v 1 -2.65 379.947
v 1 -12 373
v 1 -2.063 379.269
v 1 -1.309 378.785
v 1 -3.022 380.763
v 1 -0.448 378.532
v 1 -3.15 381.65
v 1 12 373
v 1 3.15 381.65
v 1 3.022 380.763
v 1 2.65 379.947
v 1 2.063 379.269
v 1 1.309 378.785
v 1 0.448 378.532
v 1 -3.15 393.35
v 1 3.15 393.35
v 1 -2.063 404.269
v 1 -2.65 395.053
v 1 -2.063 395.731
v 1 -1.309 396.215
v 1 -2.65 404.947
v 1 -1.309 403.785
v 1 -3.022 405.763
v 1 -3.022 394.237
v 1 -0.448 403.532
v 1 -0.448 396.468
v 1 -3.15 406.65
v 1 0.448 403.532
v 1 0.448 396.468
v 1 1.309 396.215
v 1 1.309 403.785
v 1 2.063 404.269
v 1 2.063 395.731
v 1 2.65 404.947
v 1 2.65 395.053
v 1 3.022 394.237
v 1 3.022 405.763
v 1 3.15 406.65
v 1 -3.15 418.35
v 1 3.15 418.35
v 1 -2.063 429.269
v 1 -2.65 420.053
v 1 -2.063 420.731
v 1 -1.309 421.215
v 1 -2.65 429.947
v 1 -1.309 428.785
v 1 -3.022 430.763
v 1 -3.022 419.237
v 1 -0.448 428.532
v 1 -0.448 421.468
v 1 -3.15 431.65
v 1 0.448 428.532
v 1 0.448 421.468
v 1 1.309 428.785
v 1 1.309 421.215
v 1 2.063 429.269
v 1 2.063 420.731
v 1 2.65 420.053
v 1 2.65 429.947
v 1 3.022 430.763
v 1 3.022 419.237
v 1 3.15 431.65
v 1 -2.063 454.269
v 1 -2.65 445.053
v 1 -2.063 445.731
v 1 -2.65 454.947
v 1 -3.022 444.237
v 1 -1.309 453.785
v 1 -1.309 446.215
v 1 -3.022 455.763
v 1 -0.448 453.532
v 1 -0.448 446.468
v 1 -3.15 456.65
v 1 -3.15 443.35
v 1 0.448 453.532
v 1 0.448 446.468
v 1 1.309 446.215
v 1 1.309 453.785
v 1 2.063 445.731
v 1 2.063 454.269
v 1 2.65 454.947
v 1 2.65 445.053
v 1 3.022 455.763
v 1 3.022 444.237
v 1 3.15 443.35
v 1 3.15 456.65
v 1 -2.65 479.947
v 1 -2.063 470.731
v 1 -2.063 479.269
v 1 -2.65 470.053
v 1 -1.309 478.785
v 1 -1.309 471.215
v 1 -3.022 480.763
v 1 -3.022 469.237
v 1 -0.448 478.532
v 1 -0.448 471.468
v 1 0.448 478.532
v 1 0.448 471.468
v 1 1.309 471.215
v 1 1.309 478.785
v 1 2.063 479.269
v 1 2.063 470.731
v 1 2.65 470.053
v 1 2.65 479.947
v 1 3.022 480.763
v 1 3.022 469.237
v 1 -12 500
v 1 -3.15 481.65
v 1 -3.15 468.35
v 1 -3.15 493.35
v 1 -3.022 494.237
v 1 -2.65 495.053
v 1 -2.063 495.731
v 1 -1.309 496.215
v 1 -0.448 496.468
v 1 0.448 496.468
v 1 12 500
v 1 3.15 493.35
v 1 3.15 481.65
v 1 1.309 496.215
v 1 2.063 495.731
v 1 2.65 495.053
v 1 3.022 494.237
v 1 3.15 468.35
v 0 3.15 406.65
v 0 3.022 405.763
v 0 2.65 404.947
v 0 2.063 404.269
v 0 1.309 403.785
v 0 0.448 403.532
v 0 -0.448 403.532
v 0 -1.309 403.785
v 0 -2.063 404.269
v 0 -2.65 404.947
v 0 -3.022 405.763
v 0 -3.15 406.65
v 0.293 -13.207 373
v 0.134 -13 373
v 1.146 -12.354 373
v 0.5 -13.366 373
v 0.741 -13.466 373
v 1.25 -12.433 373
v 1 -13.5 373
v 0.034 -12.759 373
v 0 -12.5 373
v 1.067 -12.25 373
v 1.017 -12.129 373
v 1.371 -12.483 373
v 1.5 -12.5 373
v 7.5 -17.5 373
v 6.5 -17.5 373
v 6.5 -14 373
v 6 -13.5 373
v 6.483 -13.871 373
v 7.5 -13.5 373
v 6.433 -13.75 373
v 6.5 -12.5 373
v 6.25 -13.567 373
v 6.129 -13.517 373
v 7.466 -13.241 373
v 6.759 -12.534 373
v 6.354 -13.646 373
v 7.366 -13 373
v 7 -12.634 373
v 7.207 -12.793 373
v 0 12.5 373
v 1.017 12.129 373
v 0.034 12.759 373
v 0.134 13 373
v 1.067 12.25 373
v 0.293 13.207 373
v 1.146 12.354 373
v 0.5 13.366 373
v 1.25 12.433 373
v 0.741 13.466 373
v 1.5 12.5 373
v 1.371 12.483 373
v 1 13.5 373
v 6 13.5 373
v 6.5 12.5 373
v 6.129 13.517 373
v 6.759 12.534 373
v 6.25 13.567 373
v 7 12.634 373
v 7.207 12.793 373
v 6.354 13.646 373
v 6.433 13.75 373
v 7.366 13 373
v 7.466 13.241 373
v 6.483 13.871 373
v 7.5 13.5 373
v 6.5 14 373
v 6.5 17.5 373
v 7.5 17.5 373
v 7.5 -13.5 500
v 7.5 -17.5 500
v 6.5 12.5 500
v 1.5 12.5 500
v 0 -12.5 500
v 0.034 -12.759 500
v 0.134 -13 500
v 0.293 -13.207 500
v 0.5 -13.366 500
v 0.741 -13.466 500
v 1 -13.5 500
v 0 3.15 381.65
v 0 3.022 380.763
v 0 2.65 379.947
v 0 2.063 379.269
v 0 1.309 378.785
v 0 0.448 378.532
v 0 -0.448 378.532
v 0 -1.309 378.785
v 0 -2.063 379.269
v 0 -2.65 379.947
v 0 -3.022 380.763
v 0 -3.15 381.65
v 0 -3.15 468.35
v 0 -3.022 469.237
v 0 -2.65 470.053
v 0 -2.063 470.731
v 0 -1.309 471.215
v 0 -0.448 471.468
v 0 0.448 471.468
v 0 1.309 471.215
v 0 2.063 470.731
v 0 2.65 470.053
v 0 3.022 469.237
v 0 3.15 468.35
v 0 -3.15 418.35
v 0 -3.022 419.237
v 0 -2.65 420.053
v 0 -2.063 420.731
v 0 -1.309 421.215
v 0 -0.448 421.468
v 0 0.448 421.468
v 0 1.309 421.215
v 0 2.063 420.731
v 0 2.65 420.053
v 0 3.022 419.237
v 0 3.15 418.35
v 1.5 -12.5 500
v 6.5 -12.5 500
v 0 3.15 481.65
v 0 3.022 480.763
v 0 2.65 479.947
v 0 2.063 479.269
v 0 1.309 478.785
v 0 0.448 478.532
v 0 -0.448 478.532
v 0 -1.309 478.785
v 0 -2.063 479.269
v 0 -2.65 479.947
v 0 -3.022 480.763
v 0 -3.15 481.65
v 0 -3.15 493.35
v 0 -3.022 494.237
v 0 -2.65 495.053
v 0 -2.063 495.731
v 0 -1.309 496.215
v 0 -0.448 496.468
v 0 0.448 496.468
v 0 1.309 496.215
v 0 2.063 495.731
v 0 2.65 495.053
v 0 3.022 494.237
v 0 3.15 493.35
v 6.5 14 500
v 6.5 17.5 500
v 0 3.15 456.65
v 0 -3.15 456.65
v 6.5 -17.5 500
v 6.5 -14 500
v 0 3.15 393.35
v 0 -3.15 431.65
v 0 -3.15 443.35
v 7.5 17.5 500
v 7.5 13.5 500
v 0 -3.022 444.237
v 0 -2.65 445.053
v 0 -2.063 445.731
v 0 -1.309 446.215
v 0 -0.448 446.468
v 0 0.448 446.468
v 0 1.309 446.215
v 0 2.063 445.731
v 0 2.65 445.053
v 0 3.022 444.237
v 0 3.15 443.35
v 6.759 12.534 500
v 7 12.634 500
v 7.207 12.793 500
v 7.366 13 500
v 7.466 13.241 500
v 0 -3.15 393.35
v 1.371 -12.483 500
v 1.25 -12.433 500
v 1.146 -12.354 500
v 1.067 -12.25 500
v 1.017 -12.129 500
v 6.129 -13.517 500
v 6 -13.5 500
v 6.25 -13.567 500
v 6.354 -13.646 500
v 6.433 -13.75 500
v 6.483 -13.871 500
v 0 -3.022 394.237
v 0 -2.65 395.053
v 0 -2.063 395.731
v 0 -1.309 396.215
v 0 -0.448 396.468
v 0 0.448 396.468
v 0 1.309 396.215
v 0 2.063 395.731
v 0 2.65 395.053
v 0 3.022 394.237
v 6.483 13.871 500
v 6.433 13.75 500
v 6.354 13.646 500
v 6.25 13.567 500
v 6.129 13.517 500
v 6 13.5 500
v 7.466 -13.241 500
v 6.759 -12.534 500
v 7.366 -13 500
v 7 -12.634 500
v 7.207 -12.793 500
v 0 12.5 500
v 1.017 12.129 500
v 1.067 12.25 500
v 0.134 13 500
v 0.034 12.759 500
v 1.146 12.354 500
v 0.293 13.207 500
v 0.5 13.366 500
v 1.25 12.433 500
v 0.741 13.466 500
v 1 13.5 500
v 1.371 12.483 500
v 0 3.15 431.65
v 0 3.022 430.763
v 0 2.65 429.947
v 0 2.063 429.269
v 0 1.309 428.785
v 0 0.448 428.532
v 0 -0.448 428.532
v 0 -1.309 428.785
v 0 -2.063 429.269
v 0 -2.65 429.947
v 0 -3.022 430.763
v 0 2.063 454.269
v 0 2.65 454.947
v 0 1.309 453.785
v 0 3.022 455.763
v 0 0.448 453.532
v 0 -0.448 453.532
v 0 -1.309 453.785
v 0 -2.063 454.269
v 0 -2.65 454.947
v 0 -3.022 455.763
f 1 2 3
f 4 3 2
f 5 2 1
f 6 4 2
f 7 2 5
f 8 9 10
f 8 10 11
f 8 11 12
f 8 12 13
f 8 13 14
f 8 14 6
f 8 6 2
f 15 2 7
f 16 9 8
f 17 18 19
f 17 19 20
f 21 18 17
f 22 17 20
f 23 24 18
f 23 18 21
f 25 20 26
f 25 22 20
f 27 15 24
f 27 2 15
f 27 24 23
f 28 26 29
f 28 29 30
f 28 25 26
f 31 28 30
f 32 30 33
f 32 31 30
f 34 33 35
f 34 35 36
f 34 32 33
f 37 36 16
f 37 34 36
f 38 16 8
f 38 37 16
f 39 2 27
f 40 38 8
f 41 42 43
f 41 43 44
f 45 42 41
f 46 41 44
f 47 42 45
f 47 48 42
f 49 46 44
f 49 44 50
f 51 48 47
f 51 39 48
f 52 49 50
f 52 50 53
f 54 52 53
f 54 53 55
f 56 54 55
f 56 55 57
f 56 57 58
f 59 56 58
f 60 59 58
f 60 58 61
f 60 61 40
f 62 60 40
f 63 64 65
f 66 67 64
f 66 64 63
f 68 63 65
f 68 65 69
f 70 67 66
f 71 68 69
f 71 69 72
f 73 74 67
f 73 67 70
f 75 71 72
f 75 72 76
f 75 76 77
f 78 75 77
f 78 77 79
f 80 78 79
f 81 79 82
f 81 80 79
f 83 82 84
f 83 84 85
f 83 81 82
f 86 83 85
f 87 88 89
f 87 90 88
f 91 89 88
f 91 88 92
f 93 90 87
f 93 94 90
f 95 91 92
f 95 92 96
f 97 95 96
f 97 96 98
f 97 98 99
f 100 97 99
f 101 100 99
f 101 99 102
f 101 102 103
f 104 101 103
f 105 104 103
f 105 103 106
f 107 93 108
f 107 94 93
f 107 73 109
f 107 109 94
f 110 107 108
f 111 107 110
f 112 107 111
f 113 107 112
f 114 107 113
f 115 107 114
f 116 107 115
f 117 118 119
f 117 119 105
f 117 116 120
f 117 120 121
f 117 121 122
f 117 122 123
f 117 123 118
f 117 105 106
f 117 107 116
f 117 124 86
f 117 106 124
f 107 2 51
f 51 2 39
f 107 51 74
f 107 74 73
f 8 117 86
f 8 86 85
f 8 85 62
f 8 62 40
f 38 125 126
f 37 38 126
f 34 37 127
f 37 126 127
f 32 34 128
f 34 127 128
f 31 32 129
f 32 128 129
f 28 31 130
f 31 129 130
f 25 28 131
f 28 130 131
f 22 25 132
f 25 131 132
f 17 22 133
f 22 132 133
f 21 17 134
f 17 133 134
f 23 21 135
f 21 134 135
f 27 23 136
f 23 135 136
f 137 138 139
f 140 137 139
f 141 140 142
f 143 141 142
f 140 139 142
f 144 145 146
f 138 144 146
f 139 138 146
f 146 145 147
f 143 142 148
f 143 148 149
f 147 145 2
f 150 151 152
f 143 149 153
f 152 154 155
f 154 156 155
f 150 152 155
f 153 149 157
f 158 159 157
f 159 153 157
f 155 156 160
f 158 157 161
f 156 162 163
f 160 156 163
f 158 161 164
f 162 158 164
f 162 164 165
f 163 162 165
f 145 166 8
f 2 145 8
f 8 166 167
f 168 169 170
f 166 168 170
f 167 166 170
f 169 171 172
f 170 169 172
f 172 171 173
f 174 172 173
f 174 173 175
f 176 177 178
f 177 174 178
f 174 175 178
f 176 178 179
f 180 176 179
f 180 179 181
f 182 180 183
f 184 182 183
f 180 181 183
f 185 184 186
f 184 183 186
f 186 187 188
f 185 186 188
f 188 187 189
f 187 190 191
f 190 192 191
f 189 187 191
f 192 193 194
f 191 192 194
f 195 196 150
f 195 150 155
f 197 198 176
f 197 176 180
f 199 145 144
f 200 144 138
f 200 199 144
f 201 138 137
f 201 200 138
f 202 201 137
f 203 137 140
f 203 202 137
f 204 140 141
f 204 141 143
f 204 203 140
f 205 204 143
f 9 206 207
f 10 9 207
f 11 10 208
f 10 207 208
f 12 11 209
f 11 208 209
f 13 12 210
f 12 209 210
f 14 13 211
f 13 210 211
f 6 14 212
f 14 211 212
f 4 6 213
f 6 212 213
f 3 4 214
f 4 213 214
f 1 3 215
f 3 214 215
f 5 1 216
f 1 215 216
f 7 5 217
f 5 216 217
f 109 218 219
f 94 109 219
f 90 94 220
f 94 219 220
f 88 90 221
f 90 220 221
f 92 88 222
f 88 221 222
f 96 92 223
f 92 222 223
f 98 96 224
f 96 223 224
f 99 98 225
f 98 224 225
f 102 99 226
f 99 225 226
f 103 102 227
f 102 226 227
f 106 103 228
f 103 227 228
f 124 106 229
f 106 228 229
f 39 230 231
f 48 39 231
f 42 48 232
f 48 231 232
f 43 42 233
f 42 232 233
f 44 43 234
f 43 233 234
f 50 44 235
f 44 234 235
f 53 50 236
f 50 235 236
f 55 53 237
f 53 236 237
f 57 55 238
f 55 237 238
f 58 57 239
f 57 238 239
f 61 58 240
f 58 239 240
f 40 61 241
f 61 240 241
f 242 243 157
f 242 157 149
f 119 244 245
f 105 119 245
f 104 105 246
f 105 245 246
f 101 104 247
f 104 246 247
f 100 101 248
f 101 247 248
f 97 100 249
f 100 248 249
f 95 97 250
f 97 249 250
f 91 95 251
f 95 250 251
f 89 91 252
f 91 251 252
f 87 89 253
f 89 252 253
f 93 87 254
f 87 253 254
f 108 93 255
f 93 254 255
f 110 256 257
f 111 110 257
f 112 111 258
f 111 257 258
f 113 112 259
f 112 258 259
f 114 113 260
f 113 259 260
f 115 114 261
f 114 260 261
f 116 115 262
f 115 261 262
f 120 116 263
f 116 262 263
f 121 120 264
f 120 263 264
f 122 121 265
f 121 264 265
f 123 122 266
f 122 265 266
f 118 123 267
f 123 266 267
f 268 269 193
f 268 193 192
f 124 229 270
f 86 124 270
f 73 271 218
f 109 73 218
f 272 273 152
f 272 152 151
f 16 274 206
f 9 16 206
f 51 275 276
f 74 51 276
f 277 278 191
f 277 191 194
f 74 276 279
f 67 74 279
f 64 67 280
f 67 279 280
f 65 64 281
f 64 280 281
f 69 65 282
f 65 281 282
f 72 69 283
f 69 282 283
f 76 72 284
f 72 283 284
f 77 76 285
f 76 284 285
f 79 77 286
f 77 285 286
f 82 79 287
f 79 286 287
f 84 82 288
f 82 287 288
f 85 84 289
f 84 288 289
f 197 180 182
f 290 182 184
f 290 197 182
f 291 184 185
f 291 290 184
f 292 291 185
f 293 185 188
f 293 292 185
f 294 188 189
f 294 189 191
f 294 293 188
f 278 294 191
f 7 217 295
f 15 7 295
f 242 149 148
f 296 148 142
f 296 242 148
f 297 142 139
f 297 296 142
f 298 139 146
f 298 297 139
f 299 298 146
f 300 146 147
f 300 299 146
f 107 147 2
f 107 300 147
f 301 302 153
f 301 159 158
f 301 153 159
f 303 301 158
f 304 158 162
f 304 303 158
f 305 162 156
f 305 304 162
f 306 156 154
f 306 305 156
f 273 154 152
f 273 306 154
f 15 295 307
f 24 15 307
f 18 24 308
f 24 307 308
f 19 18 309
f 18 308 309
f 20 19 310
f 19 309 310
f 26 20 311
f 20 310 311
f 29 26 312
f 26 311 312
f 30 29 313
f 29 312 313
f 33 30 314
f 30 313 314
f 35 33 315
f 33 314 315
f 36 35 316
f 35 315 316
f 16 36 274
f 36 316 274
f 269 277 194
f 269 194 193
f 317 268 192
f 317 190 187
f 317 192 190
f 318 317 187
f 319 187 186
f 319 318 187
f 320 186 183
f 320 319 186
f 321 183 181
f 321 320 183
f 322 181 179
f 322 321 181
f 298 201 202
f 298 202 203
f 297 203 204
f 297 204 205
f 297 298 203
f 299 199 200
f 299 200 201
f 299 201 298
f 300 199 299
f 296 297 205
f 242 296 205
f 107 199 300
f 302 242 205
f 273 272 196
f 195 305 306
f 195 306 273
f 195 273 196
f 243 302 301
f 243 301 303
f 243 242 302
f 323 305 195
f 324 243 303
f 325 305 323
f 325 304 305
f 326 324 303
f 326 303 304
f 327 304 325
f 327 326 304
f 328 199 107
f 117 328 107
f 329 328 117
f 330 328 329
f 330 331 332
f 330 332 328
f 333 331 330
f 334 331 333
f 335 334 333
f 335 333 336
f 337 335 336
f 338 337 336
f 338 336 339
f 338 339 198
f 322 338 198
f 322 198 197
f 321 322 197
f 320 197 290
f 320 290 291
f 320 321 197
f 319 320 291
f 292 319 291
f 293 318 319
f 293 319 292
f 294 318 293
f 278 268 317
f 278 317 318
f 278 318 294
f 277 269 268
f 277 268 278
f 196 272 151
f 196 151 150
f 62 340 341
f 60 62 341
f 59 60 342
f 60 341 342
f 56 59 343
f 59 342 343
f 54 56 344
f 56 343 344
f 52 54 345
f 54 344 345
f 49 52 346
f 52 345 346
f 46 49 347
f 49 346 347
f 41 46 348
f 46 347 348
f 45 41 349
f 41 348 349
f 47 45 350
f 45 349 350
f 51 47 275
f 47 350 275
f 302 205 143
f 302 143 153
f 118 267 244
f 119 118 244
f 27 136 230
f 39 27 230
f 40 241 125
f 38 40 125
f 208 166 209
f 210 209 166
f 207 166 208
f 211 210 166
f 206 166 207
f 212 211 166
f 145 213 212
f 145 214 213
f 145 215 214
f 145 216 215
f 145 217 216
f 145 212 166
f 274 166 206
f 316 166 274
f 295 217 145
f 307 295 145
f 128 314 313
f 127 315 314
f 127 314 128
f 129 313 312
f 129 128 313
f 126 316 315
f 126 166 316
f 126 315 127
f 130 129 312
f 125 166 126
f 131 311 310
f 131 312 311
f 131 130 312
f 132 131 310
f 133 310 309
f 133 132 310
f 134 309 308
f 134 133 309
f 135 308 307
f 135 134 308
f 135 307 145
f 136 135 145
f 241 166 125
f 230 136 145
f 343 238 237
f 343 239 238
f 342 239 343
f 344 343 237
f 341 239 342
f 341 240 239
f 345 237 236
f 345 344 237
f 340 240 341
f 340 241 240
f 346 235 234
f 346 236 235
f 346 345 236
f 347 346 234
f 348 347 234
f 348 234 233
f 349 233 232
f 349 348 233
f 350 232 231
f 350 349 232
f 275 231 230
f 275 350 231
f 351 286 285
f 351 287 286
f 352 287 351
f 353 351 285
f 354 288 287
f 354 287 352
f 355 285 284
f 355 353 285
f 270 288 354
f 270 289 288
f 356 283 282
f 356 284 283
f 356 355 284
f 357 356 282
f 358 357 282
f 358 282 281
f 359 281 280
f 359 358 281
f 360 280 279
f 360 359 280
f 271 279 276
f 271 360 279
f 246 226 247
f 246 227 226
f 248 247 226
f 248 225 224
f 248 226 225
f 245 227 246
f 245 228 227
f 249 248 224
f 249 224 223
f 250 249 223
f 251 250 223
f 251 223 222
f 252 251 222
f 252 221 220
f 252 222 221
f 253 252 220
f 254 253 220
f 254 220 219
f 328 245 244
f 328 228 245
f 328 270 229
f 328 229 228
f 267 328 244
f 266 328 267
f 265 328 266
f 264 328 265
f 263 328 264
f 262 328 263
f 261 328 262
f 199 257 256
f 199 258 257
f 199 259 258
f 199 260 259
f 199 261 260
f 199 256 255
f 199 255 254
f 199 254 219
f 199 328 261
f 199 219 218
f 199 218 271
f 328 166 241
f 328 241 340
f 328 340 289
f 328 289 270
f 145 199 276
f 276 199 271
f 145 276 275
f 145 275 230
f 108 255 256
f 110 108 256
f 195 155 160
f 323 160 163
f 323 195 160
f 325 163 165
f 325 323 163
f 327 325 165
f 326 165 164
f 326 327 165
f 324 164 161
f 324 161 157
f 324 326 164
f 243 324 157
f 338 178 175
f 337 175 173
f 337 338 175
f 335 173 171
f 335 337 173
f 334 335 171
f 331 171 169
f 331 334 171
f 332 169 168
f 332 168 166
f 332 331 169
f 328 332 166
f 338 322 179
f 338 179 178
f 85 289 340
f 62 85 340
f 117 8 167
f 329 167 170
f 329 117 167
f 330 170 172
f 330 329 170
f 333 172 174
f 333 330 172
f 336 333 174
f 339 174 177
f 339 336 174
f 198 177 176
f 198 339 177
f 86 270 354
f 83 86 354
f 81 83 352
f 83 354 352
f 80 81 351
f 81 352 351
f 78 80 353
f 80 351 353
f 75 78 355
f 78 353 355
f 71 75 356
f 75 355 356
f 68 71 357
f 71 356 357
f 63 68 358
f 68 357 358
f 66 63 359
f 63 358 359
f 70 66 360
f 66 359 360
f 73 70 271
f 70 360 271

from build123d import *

# Parameters (mm, degrees)
BOSS_EXTRUDE1_DEPTH = 500
CUT_EXTRUDE1_DEPTH  = 7.5
LPATTERN1_COUNT     = 40
LPATTERN1_PITCH     = 25
CUT_EXTRUDE2_START  = -127
SKETCH3_W           = 18.151488818
SKETCH3_H           = 38.961529028
CUT_EXTRUDE2_DEPTH  = 874.181233577


with BuildPart() as part:
    # Sketch1 → Boss-Extrude1 (new, symmetric)
    with BuildSketch(Plane.XY):
        with BuildLine():
            Line((7.5, 17.5), (6.5, 17.5))
            Line((6.5, 17.5), (6.5, 14))
            ThreePointArc((6.5, 14), (6.353553391, 13.646446609), (6, 13.5))
            Line((6, 13.5), (1, 13.5))
            ThreePointArc((1, 13.5), (0.292893219, 13.207106781), (0, 12.5))
            Line((0, 12.5), (0, -12.5))
            ThreePointArc((0, -12.5), (0.292893219, -13.207106781), (1, -13.5))
            Line((1, -13.5), (6, -13.5))
            ThreePointArc((6, -13.5), (6.353553391, -13.646446609), (6.5, -14))
            Line((6.5, -14), (6.5, -17.5))
            Line((6.5, -17.5), (7.5, -17.5))
            Line((7.5, -17.5), (7.5, -13.5))
            ThreePointArc((7.5, -13.5), (7.207106781, -12.792893219), (6.5, -12.5))
            Line((6.5, -12.5), (1.5, -12.5))
            ThreePointArc((1.5, -12.5), (1.146446609, -12.353553391), (1, -12))
            Line((1, -12), (1, 12))
            ThreePointArc((1, 12), (1.146446609, 12.353553391), (1.5, 12.5))
            Line((1.5, 12.5), (6.5, 12.5))
            ThreePointArc((6.5, 12.5), (7.207106781, 12.792893219), (7.5, 13.5))
            Line((7.5, 13.5), (7.5, 17.5))
        make_face()
    extrude(amount=BOSS_EXTRUDE1_DEPTH, both=True)

    # Sketch2 → Cut-Extrude1 (cut)
    with BuildSketch(Plane(origin=(0, 0, 0), x_dir=(0, 0, -1), z_dir=(1, 0, 0))):
        with BuildLine():
            Line((-493.35, 3.15), (-481.65, 3.15))
            ThreePointArc((-481.65, 3.15), (-478.5, 0), (-481.65, -3.15))
            Line((-481.65, -3.15), (-493.35, -3.15))
            ThreePointArc((-493.35, -3.15), (-496.5, 0), (-493.35, 3.15))
        make_face()
    cut_extrude1 = extrude(amount=CUT_EXTRUDE1_DEPTH, mode=Mode.SUBTRACT)

    # LPattern1: Cut-Extrude1 ×40
    with Locations(*[(0, 0, -i * LPATTERN1_PITCH) for i in range(1, LPATTERN1_COUNT)]):
        add(cut_extrude1, mode=Mode.SUBTRACT)

    # Sketch3 → Cut-Extrude2 (cut, through all)
    with BuildSketch(Plane.XY.offset(500).offset(CUT_EXTRUDE2_START)):
        with Locations((4.262528883, -0.137511279)):
            Rectangle(SKETCH3_W, SKETCH3_H)
    extrude(amount=-CUT_EXTRUDE2_DEPTH, mode=Mode.SUBTRACT)


solid = part.part
